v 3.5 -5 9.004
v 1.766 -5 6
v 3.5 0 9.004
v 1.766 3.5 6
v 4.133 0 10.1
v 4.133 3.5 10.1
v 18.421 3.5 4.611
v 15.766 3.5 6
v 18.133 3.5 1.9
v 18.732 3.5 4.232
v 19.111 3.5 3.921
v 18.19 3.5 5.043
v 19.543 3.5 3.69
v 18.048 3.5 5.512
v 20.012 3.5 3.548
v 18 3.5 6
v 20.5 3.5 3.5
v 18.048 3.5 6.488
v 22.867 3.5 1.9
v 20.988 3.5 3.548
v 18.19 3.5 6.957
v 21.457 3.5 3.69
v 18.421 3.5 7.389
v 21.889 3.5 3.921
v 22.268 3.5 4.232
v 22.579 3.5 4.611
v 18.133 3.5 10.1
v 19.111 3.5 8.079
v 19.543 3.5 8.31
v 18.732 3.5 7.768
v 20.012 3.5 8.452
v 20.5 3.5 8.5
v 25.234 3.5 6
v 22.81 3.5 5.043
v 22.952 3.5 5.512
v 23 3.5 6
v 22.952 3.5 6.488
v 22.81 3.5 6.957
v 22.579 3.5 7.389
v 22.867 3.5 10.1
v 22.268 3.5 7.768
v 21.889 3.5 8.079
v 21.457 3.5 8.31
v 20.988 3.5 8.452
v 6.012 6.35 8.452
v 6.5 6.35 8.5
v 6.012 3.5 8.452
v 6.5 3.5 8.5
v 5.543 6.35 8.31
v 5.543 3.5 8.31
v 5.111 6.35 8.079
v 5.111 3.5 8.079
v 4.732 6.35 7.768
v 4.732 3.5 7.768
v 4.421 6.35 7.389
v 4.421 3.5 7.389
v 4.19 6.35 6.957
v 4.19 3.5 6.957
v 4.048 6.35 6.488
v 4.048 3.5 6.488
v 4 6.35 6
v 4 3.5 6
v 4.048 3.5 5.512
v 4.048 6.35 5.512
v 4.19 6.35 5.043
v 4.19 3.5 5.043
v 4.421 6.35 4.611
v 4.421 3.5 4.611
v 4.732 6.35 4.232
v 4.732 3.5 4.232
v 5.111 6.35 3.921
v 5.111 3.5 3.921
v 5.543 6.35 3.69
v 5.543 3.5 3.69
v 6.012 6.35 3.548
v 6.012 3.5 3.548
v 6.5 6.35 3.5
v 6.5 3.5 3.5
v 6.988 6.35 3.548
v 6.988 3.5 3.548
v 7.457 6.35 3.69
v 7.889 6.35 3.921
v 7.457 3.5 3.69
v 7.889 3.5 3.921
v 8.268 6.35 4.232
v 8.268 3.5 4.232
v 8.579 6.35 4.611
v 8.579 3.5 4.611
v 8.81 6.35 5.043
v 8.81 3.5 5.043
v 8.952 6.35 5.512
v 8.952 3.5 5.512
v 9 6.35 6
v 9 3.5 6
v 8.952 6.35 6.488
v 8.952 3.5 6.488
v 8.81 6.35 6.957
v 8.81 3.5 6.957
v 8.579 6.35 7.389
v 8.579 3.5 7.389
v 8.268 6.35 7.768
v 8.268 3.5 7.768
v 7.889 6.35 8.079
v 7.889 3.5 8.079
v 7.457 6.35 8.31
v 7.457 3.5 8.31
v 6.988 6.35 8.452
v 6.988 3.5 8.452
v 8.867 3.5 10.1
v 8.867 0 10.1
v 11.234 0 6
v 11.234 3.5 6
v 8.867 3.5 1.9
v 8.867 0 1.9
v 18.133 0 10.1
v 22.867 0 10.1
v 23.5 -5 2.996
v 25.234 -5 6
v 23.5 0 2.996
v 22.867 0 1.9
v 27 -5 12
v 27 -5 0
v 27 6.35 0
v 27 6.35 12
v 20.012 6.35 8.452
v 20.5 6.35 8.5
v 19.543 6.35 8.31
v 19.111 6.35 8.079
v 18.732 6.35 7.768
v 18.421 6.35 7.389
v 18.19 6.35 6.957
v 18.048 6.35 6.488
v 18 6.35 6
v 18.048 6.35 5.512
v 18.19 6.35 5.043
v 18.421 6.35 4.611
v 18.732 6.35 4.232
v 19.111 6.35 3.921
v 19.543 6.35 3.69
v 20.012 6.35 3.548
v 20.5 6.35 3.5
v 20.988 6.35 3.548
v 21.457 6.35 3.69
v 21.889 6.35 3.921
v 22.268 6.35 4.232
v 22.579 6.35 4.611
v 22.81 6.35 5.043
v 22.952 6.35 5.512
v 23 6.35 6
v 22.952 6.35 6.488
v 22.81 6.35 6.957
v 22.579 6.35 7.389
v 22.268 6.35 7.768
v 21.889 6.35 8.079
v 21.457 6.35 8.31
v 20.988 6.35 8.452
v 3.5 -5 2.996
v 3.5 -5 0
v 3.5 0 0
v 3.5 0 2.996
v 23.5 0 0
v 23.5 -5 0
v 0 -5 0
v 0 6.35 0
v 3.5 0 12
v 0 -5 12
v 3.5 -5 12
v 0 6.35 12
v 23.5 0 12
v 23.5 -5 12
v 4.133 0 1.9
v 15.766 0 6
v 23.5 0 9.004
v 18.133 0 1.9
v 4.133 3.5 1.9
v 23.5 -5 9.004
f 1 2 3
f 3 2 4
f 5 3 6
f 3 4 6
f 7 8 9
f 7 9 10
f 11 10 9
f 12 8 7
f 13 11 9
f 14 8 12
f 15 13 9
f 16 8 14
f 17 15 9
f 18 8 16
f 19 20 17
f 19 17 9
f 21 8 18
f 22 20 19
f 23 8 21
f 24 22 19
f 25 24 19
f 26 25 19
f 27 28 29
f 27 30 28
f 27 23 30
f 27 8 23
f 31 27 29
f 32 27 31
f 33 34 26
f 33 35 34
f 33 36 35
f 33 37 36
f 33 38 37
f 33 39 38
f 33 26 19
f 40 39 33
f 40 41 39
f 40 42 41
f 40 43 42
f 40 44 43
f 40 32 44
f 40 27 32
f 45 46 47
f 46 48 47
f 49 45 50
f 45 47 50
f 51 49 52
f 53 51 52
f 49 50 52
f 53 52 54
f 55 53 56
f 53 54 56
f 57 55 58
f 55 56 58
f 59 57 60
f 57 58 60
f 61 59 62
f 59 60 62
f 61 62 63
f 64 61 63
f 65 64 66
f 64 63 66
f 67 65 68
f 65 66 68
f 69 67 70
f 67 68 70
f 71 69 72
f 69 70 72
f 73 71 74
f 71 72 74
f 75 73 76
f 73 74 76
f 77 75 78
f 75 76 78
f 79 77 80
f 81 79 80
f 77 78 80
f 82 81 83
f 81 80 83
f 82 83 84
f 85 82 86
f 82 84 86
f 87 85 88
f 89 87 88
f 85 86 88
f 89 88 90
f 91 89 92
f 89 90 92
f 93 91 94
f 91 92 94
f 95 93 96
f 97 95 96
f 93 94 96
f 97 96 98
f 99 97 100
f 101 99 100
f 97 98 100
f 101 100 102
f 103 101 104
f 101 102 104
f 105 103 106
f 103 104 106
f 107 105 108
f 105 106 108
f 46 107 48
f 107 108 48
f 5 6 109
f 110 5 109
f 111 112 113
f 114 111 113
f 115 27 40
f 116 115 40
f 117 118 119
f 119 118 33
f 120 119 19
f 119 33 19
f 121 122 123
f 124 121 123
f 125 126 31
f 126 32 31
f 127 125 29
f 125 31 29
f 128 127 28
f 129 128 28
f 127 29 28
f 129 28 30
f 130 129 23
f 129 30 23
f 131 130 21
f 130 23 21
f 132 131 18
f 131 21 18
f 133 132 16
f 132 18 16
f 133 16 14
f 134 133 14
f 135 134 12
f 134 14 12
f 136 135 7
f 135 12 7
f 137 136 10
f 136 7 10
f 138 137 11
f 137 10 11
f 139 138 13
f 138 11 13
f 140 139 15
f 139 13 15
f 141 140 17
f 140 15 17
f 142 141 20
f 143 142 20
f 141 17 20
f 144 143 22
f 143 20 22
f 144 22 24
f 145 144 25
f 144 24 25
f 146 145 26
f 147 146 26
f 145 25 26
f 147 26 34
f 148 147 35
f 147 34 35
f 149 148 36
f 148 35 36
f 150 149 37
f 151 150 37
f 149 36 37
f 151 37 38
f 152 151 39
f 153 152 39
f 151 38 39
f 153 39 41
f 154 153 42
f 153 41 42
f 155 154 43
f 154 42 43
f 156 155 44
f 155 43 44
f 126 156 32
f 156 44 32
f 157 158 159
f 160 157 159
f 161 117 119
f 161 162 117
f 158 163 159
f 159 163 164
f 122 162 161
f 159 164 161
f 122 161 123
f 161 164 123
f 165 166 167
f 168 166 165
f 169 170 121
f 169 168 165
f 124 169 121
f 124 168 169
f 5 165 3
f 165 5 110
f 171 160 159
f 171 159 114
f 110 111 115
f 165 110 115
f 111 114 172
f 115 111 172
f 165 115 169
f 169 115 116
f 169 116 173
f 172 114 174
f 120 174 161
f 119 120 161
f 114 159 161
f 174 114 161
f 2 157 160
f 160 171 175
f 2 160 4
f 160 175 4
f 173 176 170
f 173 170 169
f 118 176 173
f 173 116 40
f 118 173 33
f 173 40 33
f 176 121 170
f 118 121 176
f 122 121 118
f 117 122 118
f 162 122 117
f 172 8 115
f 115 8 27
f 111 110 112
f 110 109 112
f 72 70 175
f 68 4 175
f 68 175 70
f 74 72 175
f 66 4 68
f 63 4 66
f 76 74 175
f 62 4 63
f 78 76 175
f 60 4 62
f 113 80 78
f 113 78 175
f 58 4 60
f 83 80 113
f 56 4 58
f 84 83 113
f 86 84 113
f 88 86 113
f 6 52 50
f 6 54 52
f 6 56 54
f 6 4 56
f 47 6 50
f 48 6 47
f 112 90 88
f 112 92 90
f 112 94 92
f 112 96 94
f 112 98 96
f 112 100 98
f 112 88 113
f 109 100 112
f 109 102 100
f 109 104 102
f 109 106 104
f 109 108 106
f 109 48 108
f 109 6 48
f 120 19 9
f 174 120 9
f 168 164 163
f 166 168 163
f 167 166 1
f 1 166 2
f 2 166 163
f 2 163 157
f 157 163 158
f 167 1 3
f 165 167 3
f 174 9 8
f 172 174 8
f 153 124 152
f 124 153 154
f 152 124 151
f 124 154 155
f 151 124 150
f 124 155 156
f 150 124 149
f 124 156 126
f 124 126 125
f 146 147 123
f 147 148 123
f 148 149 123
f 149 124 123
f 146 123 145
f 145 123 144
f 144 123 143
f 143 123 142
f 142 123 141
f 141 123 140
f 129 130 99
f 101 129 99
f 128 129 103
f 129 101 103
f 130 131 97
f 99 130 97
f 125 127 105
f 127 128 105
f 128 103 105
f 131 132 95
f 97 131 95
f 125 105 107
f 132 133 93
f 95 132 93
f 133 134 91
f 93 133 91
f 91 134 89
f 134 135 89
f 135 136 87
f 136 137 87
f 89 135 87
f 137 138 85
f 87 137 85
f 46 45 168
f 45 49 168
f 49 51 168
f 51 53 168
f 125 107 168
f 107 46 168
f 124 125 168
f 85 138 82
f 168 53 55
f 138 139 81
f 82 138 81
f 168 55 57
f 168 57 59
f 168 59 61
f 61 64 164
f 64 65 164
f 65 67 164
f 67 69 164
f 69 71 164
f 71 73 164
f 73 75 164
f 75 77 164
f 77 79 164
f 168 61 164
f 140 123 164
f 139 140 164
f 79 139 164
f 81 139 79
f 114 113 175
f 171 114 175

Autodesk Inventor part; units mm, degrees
ref_plane "YZ Plane" through (0, 0, 0) normal (1, 0, 0) x (0, 1, 0)
ref_plane "XZ Plane" through (0, 0, 0) normal (0, 1, 0) x (-1, 0, 0)
ref_plane "XY Plane" through (0, 0, 0) normal (0, 0, 1) x (1, 0, 0)
sketch "Sketch1" plane through (0, 0, 0) normal (0, 0, 1) x (1, 0, 0)
  line L0 (0, 0) -> (27, 0)
  line L1 (27, 0) -> (27, 6.35)
  line L2 (27, 6.35) -> (0, 6.35)
  line L3 (0, 6.35) -> (0, 0)
  line L4 (0, 0) -> (0, -5)
  line L5 (0, -5) -> (3.5, -5)
  line L6 (3.5, -5) -> (3.5, 0)
  line L7 (27, 0) -> (27, -5)
  line L8 (27, -5) -> (23.5, -5)
  line L9 (23.5, -5) -> (23.5, 0)
  dimension "d0" = 27
  dimension "d1" = 6.35
  dimension "d14" = 20
  dimension "d15" = 5
extrude "Extrusion1" add sketch "Sketch1" along normal blind 12
sketch "Sketch2" plane through (0, 6.35, 0) normal (0, 1, 0) x (1, 0, 0)
  line L0 (0, 0) -> (0, -12) projected
  line L1 (27, 0) -> (27, -12) projected
  point P0 (6.5, -6)
  point P1 (20.5, -6)
  point P2 (0, -6)
  dimension "d4" = 6.5
  dimension "d5" = 6.5
  dimension "d6" = 14
hole "Hole1" at (6.5, 6.35, 6) at (20.5, 6.35, 6) direction (0, -1, 0) diameter 5 end through all
sketch "Sketch3" plane through (3.5, 0, 0) normal (0, -1, 0) x (1, 0, 0)
  circle A0 centre (3, 6) radius 2.5 projected
  circle A1 centre (17, 6) radius 2.5 projected
  line L0 (0, 0) -> (20, 0) projected
  line L1 (20, 0) -> (20, 12) projected
  line L2 (0, 12) -> (20, 12) projected
  line L3 (0, 0) -> (0, 12) projected
  line L4 (7.7343, 6) -> (5.3671, 1.9)
  line L5 (5.3671, 1.9) -> (0.6329, 1.9)
  line L6 (0.6329, 1.9) -> (-1.7343, 6)
  line L7 (-1.7343, 6) -> (0.6329, 10.1)
  line L8 (0.6329, 10.1) -> (5.3671, 10.1)
  line L9 (5.3671, 10.1) -> (7.7343, 6)
  point P0 (-3.5, 0)
  point P1 (0, 9.0038)
  point P2 (0, 2.9962)
  dimension "d16" = 8.2
extrude "Extrusion2" cut sketch "Sketch3" along normal blind 6.75 and the other way blind 3.5 contours L6 L7 L3 | L3 L7 L8 L9 L4 L5 L6
ref_plane "Work Plane1" through (13.5, -5, 0) normal (1, 0, 0) x (0, 0, -1)
mirror "Mirror1" about plane through (13.5, -5, 0) normal (1, 0, 0) of "Extrusion2"
equation "\"d5\" = d4"
properties part number "Idle Bearing mount"
